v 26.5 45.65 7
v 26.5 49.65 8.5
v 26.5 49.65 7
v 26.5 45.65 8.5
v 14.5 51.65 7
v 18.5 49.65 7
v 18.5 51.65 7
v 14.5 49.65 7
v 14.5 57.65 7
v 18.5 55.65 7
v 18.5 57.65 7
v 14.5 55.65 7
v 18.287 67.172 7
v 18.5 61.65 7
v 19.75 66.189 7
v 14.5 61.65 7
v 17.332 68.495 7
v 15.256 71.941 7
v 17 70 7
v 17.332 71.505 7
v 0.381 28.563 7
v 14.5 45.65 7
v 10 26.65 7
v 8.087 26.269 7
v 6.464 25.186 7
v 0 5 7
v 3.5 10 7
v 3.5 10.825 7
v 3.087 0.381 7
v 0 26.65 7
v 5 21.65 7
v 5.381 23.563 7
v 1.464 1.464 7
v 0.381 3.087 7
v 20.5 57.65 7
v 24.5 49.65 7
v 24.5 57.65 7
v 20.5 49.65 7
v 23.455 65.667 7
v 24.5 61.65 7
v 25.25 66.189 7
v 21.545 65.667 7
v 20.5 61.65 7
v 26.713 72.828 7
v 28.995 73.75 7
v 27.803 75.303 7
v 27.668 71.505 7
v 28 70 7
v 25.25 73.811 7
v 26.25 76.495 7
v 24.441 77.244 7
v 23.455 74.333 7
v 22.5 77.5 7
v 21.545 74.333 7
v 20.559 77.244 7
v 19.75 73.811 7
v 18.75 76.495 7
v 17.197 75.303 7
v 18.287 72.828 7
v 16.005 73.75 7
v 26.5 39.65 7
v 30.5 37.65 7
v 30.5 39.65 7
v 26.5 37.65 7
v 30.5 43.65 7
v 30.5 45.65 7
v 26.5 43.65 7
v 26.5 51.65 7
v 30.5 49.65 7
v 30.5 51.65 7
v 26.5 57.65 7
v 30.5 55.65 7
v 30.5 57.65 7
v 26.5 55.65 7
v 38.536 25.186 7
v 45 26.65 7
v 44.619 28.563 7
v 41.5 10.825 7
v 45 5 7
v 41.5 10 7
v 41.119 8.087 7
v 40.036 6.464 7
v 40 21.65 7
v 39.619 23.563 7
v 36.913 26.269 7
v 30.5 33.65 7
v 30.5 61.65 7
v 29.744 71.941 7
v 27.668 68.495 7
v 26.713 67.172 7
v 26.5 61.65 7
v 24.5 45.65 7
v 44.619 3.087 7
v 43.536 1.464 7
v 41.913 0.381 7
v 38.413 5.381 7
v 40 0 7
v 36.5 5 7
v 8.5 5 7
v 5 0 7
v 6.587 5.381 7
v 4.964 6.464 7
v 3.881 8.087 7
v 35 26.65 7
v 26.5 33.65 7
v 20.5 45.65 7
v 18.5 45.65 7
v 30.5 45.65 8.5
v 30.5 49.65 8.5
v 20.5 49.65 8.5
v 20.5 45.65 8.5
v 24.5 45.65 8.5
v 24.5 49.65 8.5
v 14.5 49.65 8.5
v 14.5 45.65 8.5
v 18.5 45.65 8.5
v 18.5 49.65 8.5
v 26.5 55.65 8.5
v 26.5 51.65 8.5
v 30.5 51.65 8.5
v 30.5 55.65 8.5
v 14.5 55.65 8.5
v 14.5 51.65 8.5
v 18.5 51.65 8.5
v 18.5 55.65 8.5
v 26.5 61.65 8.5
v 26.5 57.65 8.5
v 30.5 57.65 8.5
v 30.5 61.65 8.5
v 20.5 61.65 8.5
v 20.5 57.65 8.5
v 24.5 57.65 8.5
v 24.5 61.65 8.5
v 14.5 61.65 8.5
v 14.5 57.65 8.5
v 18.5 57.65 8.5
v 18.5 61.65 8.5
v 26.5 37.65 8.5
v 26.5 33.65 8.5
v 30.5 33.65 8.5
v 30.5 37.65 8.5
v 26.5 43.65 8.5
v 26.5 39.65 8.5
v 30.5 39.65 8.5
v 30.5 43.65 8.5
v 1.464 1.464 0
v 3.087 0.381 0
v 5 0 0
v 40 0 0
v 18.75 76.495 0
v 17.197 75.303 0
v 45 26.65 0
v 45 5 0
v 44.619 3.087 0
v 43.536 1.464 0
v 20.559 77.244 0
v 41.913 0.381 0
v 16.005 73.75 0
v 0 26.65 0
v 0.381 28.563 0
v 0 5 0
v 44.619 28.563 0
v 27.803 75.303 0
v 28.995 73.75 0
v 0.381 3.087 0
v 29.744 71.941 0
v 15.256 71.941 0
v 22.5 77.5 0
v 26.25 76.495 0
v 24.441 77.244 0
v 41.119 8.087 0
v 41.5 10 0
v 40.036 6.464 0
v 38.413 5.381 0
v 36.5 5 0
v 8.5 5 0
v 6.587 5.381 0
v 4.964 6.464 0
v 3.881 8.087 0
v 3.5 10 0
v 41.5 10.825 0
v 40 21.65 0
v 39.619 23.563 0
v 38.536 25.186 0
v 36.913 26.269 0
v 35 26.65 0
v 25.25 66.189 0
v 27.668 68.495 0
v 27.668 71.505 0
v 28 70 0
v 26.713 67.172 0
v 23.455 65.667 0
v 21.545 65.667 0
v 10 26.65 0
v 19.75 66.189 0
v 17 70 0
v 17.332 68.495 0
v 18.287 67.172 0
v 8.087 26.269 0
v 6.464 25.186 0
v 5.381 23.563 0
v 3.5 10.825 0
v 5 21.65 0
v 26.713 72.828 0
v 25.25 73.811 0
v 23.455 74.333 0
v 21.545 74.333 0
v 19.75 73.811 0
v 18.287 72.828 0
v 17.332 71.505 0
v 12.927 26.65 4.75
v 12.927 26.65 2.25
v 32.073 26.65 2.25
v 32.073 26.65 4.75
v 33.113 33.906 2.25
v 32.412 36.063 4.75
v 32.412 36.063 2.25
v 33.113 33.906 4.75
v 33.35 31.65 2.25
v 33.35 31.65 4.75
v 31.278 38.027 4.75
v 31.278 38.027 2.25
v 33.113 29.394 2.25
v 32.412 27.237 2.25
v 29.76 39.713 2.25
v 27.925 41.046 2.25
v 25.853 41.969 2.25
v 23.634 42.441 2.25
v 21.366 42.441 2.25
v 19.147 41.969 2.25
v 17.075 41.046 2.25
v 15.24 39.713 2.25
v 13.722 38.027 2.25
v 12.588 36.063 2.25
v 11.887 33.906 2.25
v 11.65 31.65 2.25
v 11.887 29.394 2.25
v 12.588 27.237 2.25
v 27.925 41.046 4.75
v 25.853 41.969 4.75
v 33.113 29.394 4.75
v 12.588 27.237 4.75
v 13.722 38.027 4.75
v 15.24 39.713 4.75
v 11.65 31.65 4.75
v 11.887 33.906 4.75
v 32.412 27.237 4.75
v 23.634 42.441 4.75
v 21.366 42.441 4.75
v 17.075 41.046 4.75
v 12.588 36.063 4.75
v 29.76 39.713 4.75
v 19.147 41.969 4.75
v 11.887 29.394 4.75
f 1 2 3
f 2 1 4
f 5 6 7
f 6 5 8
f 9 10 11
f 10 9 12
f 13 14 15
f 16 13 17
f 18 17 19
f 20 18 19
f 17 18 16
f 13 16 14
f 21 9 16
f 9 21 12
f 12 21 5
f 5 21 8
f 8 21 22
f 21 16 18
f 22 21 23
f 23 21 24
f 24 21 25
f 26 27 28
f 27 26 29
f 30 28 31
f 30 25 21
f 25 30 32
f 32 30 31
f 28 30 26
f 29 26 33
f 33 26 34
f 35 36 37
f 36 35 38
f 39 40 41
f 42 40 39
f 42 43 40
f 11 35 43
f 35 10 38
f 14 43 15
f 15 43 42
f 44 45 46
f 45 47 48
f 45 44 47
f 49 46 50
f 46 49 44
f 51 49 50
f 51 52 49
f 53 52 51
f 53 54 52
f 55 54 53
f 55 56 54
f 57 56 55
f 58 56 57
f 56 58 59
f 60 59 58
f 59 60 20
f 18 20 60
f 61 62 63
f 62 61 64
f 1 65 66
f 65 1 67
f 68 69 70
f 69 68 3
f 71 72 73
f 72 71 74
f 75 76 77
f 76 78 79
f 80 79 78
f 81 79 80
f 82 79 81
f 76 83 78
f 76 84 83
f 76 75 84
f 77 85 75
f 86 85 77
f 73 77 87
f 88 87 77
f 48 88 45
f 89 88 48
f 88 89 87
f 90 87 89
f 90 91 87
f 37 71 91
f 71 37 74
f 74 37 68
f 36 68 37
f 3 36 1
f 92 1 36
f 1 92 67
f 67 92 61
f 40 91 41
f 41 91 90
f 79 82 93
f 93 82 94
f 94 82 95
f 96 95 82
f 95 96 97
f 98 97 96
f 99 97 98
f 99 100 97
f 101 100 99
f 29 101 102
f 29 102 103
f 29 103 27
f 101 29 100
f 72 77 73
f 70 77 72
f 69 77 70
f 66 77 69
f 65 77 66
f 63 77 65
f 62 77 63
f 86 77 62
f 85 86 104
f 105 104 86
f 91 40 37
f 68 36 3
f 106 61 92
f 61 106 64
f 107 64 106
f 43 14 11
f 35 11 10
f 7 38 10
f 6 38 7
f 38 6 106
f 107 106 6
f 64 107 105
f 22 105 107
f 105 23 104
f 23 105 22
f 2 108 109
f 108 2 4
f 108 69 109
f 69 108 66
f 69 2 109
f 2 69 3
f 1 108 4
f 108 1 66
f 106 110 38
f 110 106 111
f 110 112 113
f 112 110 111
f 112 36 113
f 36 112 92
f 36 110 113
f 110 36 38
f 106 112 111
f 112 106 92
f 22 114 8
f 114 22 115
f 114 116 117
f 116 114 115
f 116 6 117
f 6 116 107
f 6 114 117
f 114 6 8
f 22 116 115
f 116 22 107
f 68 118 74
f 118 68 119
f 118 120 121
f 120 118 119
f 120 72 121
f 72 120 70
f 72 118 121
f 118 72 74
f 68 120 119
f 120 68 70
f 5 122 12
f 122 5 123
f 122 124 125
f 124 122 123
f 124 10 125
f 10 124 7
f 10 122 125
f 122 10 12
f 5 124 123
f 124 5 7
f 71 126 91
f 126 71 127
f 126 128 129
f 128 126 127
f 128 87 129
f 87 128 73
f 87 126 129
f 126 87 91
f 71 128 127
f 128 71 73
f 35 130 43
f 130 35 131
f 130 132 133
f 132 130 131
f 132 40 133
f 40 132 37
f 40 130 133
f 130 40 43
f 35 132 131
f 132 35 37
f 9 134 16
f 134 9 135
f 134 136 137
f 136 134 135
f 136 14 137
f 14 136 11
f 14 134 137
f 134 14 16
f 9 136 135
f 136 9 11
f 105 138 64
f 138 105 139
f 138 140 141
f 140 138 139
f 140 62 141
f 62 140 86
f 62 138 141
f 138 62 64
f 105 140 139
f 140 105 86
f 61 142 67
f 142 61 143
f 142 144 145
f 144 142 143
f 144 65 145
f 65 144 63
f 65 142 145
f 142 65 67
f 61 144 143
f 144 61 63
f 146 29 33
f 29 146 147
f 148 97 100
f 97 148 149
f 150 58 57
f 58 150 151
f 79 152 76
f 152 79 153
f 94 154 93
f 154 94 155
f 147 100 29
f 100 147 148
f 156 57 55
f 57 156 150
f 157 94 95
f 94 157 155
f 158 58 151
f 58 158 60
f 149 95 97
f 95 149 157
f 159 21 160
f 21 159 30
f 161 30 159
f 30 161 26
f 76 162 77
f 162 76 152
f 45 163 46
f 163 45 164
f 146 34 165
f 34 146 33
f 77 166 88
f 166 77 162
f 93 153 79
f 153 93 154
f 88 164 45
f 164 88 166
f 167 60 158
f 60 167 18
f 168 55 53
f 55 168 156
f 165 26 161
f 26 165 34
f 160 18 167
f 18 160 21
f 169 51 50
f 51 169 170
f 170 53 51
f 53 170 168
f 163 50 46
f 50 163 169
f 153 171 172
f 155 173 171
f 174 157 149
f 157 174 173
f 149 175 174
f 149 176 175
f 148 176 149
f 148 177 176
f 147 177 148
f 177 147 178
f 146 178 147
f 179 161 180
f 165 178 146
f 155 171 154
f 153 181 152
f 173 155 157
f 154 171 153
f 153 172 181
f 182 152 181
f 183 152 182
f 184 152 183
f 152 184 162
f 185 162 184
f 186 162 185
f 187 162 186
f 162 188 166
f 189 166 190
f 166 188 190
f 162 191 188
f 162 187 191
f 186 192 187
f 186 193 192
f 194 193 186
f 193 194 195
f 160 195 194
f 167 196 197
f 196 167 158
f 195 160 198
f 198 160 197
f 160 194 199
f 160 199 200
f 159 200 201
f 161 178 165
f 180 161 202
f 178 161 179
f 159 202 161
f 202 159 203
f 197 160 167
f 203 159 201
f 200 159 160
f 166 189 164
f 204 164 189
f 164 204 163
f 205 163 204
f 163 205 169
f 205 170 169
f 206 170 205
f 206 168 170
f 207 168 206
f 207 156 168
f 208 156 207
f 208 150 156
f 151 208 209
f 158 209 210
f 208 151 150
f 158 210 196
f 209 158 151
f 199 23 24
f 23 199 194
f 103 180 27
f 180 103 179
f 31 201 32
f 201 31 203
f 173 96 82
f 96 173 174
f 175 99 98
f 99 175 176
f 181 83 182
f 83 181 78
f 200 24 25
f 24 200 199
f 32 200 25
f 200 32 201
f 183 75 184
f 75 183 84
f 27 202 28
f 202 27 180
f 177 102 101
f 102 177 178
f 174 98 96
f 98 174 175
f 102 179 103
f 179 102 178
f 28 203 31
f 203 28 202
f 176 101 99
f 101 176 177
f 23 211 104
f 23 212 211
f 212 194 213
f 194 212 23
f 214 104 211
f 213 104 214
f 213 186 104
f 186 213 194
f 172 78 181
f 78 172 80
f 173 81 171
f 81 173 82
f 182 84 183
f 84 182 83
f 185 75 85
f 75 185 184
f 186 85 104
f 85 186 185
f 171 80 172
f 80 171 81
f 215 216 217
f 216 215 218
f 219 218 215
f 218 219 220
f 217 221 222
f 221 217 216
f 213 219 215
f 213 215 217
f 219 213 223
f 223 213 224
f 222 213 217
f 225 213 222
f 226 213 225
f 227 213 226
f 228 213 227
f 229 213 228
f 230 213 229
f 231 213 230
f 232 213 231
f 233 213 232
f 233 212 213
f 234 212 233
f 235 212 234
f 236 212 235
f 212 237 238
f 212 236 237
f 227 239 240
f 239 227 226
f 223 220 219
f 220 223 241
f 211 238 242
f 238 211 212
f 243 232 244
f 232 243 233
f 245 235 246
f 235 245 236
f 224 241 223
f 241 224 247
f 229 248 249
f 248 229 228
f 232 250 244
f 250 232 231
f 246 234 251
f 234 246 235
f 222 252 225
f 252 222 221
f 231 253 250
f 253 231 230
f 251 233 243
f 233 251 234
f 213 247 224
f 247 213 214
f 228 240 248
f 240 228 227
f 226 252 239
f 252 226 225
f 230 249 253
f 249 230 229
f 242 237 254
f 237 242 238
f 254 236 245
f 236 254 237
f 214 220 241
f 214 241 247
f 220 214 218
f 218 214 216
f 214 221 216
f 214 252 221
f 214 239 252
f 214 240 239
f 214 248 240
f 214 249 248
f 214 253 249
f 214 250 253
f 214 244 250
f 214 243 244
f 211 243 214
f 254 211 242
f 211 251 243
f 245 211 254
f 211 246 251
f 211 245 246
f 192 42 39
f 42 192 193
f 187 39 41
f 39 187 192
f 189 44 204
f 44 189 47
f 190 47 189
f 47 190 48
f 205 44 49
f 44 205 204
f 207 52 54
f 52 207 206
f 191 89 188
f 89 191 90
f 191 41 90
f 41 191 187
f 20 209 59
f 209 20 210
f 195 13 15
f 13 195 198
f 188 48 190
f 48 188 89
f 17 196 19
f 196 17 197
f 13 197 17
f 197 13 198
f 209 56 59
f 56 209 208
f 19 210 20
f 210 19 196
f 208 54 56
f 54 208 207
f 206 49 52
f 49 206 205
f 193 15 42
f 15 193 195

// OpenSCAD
/**
 * Coin bottle opener
 * Designed by Niek Blankers <niek@niekproductions.com>
 * 
 * Set fill to 90-100% for best results.
 * Insert coin during printing!
 * 
 */

/**
 * 5 cent euro coin:
 * Diameter: 21.3
 * Thickness: 1.7
 *
 * 10 cent euro coin:
 * Diameter: 19.8 
 * Thickness: 2.0
 *
 * 20 cent euro coin:
 * Diameter: 22.3
 * Thickness: 2.2
 *
 * 50 cent euro coin:
 * Diameter: 24.3
 * Thickness: 2.4
 * 
 * US penny:
 * Diameter: 19.1
 * Thickness: 1.6
 *
 * US nickel:
 * Diameter: 21.2
 * Thickness: 2.0
 *
 * US dime:
 * Diameter: 17.9
 * Thickness: 1.4
 *
 * US quarter:
 * Diameter: 24.3
 * Thickness: 1.8
 *
 * US 50 cent:
 * Diameter: 30.6
 * Thickness: 2.2
 */

// Coin diameter
coinDiameter = 21.3; // [21.3:0.05 euro, 19.8:0.10 euro, 22.3:0.20 euro, 24.3:0.50 euro, 19.1:US penny, 21.2:US nickel, 17.9:US dime, 24.3:US quarter, 30.6:US 50 cent]

// Coin thickness
coinThickness = 1.7; // [1.7:0.05 euro, 2.0:0.10 euro, 2.2:0.20 euro, 2.4:0.50 euro, 1.6:US penny, 2.0:US nickel, 1.4:US dime, 1.8:US quarter, 2.2:US 50 cent]

// Coin clearance
coinClearance = 0.4;

// Coin offset from center
coinOffset = 5; // [0:10]

// Coin angle
coinAngle = 0; // [0:15]

// Opener width
width=45; // [40:100]

// Opener length
length=85; // [65:100]

// Opener height
height=7; // [5:20]

// Front opener width
frontWidth=45; // [45:105]

// Back opener width
backWidth = 15; // [10:100]

// Edge width
edgeWidth=5; // [2:20]

// Edge round radius
roundRadius=5; // [0:10]

// Logo cube size (WxLxH)
cubeSize = [4,4,1.5];

// Logo cube spacing
cubeSpacing = 6; // [1:10]

// For the Bitmap
bits=[
	[1,0,0],
	[1,0,0],
	[1,1,1],
	[1,0,1],
	[1,1,1]
];

openingWidth=width-(edgeWidth*2);
openingLength=16-coinOffset+coinDiameter/2;
openingHeight=height;
frontOpeningWidth=openingWidth+3;

frontLength = openingLength+edgeWidth*2;

chainHole = backWidth-4; //Keychain hole diameter

module handle(){
		hull(){
				translate([-(frontWidth-width)/2,0,0]) roundedRect([frontWidth,frontLength/2,height], roundRadius);
				translate([0,frontLength/2,0]) roundedRect([width,frontLength/2,height], roundRadius);
				translate([width/2,length-backWidth,height/2]) cylinder(h=height, r=backWidth/2, center=true);
		}
}

module opener(){
	difference(){
		union(){
			handle();
			translate([width/2 + (cubeSpacing*((len(bits[1])-1)/2)),frontLength + (length-frontLength)/((length-frontLength)/cubeSize[1]),height+cubeSize[2]/2]) rotate(a=[0,0,180]) drawBitmap(bits, cubeSpacing, cubeSize);
		}

		translate([(width/2)-(openingWidth/2),edgeWidth,-1]) hull(){
			translate([-(frontOpeningWidth-openingWidth)/2,0,0]) roundedRect([frontOpeningWidth,openingLength/2,openingHeight+2], roundRadius);
			translate([0,openingLength/2,0]) roundedRect([openingWidth,openingLength/2,openingHeight+2], roundRadius);
		}

		translate([width/2,edgeWidth+openingLength+coinOffset,height/2]) rotate(a=-coinAngle,v=[1,0,0]){
			cylinder(h = coinThickness+coinClearance*2, r = (coinDiameter+coinClearance)/2, center = true);
		}

		translate([width/2,length-backWidth,height/2]) scale([1.0,0.8,1.0]) cylinder(h=height+1, r=chainHole/2, center=true);

	}	

}

opener();


module roundedRect(size, radius) { // from http://www.thingiverse.com/thing:9347/#comments
	x = size[0];
	y = size[1];
	z = size[2];
	
	linear_extrude(height=z)
		hull() {
			translate([radius, radius, 0])
			circle(r=radius);
	
			translate([x - radius, radius, 0])
			circle(r=radius);
	
			translate([x - radius, y - radius, 0])
			circle(r=radius);
	
			translate([radius, y - radius, 0])
			circle(r=radius);
	}
}

/**
 * drawBitmap module
 * By Niek Blankers <niek@niekproductions.com>
 *
 * @param	array		bits			Bitmap array
 * @param	decimal	cubeSpacing	
 * @param	decimal	cubeSize
 *
 * Example:
 *
	bits=[
	[1,0,0,1,0,1,0,1,1,1,0,1,0,0,1],
	[1,1,0,1,0,1,0,1,0,0,0,1,0,1,0],
	[1,0,1,1,0,1,0,1,1,0,0,1,1,0,0],
	[1,0,0,1,0,1,0,1,0,0,0,1,0,1,0],
	[1,0,0,1,0,1,0,1,1,1,0,1,0,0,1]
	];
	cubeSize = 4;
	cubeSpacing = 5;

	drawBitmap(bits, cubeSpacing, cubeSize);
 *
 */

module drawBitmap(bits, cubeSpacing, cubeSize){
	rotate(a=180, v=[1,0,0]){
		for(i=[0:len(bits)-1]){
			translate([0,i*cubeSpacing,0]){
				for(x=[0:len(bits[i])-1]){
					translate([x*cubeSpacing,0,0]) cube(size = bits[i][x]*cubeSize, center = true);
				}
			}
		}
	}
}
